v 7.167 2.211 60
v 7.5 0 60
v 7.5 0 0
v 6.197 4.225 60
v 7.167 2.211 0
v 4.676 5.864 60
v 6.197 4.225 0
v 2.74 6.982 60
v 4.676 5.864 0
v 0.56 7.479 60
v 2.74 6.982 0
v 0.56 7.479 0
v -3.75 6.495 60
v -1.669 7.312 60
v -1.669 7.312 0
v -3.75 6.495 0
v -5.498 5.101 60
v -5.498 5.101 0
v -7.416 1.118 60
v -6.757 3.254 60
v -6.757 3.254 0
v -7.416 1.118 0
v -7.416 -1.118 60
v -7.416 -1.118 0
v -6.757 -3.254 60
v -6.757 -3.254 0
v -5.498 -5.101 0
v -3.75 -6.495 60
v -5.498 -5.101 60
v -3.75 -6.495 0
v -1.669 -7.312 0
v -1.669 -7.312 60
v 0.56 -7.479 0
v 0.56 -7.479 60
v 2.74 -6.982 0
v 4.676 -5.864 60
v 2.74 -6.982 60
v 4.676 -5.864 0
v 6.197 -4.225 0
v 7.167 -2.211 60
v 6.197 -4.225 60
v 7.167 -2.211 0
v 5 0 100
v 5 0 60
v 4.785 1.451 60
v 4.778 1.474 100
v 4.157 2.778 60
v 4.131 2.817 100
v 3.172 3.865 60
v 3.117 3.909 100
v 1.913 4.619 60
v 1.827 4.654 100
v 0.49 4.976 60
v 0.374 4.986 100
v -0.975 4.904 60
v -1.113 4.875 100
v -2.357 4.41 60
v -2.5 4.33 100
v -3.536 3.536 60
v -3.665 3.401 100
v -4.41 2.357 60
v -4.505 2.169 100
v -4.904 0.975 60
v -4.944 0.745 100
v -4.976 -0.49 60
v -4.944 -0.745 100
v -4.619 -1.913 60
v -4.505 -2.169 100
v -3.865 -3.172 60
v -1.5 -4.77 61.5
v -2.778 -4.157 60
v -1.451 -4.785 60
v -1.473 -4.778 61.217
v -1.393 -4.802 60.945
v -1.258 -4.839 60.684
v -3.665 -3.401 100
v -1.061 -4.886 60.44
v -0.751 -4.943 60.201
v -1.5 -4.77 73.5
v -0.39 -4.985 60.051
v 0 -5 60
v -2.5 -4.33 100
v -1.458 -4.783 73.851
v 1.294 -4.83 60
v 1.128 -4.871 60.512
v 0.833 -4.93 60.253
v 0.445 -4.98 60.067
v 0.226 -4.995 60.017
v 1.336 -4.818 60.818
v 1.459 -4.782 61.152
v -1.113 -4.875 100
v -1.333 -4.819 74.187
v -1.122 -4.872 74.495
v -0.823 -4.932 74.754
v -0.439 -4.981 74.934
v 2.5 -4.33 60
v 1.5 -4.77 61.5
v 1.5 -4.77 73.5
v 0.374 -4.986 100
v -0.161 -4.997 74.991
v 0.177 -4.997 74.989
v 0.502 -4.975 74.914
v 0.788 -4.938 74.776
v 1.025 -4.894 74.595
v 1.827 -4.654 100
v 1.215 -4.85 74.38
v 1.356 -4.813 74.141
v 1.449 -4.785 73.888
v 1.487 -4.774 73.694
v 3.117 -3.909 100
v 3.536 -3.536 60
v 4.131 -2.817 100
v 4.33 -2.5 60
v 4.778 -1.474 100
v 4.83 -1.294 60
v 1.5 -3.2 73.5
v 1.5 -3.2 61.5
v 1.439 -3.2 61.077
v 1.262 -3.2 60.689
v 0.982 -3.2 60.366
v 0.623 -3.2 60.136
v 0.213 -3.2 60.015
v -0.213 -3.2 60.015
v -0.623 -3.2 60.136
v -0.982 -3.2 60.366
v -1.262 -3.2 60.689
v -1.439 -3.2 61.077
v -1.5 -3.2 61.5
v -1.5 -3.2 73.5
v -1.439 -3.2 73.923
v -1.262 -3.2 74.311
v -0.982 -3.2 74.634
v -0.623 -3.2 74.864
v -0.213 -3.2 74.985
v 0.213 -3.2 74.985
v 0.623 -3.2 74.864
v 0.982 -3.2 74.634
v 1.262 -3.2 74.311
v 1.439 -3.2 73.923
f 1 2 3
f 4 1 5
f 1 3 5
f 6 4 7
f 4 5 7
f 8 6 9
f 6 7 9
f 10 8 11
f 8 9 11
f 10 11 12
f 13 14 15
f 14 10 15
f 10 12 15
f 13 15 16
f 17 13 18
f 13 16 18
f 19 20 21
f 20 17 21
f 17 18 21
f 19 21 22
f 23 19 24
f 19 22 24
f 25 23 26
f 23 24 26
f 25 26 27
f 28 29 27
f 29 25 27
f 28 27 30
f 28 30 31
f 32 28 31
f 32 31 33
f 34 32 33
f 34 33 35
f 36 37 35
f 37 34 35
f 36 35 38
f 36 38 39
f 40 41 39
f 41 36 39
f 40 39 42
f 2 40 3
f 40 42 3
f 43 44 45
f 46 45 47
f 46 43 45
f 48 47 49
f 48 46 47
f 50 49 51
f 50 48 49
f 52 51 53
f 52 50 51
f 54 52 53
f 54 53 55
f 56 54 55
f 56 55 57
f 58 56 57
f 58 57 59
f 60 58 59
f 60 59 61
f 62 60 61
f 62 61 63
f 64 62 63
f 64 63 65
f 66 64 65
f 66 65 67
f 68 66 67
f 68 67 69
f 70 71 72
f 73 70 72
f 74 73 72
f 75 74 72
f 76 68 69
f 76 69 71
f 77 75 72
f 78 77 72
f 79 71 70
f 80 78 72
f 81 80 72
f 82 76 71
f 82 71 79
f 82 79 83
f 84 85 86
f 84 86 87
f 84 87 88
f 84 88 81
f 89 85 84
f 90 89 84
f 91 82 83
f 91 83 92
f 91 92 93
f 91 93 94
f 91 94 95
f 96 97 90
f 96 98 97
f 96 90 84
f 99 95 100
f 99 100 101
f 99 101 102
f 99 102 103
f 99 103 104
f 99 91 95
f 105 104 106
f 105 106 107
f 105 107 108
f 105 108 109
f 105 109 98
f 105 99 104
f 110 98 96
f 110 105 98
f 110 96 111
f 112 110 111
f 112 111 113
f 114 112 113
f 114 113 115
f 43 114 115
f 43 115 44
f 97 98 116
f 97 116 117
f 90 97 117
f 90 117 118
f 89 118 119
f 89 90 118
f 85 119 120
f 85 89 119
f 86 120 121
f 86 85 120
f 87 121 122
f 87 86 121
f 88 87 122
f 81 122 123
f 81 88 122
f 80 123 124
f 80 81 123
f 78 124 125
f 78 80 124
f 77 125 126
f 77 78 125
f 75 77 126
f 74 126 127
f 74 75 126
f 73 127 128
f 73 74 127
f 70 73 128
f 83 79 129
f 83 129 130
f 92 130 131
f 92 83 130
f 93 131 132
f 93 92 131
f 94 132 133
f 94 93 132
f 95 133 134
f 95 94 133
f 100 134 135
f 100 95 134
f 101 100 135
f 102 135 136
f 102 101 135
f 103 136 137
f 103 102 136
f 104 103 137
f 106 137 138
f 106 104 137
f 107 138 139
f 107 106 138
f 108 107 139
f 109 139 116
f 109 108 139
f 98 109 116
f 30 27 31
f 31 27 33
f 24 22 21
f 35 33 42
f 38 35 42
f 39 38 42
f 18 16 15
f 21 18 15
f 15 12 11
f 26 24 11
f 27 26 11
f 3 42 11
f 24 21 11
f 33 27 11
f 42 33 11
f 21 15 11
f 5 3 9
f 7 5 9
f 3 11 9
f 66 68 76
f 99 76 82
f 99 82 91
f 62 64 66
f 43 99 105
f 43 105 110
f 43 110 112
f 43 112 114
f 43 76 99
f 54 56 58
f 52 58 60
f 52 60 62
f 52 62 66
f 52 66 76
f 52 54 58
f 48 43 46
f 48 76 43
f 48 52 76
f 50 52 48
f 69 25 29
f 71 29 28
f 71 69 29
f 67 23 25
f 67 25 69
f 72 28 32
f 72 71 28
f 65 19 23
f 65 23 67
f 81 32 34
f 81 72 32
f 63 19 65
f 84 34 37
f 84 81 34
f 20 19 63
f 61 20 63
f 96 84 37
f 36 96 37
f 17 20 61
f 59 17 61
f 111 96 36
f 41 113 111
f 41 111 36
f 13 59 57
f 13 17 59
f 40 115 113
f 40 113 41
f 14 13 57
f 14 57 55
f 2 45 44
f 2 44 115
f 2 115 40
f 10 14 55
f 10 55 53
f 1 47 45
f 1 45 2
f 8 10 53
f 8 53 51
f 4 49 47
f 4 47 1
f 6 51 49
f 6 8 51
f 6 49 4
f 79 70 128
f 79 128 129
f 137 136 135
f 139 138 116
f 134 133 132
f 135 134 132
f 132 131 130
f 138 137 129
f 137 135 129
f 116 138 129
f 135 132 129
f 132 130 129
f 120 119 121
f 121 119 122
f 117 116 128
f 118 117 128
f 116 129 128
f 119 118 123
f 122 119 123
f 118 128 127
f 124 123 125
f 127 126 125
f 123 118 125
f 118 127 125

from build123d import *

# Parameters (mm, degrees)
SKETCH_1_R           = 7.5
EXTRUDE_1_DEPTH      = 100
SKETCH_2_OUTSIDE_W   = 37.446
SKETCH_2_OUTSIDE_H   = 37.446
SKETCH_2_OUTSIDE_R   = 5
CUT_EXTRUDE_1_DEPTH  = 40
CUT_EXTRUDE_START    = 5
CUT_EXTRUDE_13_DEPTH = 1.8


with BuildPart() as part:
    # 草图1 → 凸台-拉伸1 (new body)
    with BuildSketch(Plane.XY):
        Circle(SKETCH_1_R)
    extrude(amount=EXTRUDE_1_DEPTH)

    # 草图2 outside → 切除-拉伸1 (cut)
    with BuildSketch(Plane.XY.offset(100)):
        Rectangle(SKETCH_2_OUTSIDE_W, SKETCH_2_OUTSIDE_H)
        Circle(SKETCH_2_OUTSIDE_R, mode=Mode.SUBTRACT)
    extrude(amount=-CUT_EXTRUDE_1_DEPTH, mode=Mode.SUBTRACT)

    # 草图33 → 切除-拉伸13 (cut)
    with BuildSketch(Plane(origin=(-20, 0, 100), x_dir=(0, 0, 1), z_dir=(1.0206823934513925e-11, -1.0, 0)).offset(CUT_EXTRUDE_START)):
        with BuildLine():
            Line((-38.5, -18.5), (-26.5, -18.5))
            ThreePointArc((-26.5, -18.5), (-25, -20), (-26.5, -21.5))
            Line((-26.5, -21.5), (-38.5, -21.5))
            ThreePointArc((-38.5, -21.5), (-40, -20), (-38.5, -18.5))
        make_face()
    extrude(amount=-CUT_EXTRUDE_13_DEPTH, mode=Mode.SUBTRACT)


solid = part.part
